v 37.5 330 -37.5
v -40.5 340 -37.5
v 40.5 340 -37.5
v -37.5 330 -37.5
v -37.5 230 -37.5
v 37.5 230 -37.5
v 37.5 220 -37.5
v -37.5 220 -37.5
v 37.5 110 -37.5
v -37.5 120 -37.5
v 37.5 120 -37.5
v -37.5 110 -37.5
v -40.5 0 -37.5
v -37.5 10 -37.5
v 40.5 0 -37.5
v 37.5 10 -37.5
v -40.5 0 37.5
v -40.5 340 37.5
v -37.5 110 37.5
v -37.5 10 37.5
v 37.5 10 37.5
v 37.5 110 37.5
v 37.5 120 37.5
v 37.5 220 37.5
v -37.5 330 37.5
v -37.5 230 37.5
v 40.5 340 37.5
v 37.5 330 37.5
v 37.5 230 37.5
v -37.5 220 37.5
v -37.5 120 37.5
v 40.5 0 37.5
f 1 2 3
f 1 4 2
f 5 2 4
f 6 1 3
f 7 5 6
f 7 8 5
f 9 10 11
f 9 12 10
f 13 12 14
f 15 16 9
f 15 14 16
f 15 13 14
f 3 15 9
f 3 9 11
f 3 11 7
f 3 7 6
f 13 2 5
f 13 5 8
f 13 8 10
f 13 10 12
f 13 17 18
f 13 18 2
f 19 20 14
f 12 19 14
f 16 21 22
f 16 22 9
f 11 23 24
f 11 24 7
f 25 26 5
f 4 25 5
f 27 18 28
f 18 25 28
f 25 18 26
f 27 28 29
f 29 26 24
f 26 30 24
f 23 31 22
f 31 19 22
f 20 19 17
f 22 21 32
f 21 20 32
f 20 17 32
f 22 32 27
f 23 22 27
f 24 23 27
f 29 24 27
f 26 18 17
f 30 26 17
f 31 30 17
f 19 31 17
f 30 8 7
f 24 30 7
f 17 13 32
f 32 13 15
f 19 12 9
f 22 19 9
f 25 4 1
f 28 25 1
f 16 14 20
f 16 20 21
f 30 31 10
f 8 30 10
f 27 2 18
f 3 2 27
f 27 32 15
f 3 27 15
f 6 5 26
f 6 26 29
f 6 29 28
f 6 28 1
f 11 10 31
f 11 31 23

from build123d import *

# Parameters (mm, degrees)
SKETCH3_W           = 75
SKETCH3_H           = 75
BOSS_EXTRUDE2_DEPTH = 10
LPATTERN1_COUNT     = 4
LPATTERN1_PITCH     = 110
SKETCH3_5_W         = 3
SKETCH3_5_H         = 75
BOSS_EXTRUDE5_DEPTH = 340


with BuildPart() as part:
    # Sketch3 → Boss-Extrude2 (new body)
    with BuildSketch(Plane(origin=(0, 0, 0), x_dir=(1, 0, 0), z_dir=(0, 1, 0))):
        Rectangle(SKETCH3_W, SKETCH3_H)
    extrude(amount=BOSS_EXTRUDE2_DEPTH)


with BuildPart() as lpattern1_1:
    # LPattern1: pattern copy
    add(part.part.moved(Location(Vector(0, 1, 0) * (1 * LPATTERN1_PITCH))))


with BuildPart() as lpattern1_2:
    # LPattern1: pattern copy
    add(part.part.moved(Location(Vector(0, 1, 0) * (2 * LPATTERN1_PITCH))))


with BuildPart() as lpattern1_3:
    # LPattern1: pattern copy
    add(part.part.moved(Location(Vector(0, 1, 0) * (3 * LPATTERN1_PITCH))))


with BuildPart() as part_1:
    add(part.part)

    add(lpattern1_1.part)  # Boss-Extrude5 merges LPattern1_1

    add(lpattern1_2.part)  # Boss-Extrude5 merges LPattern1_2

    add(lpattern1_3.part)  # Boss-Extrude5 merges LPattern1_3
    # Sketch3<5> → Boss-Extrude5 (add)
    with BuildSketch(Plane(origin=(0, 0, 0), x_dir=(1, 0, 0), z_dir=(0, 1, 0))):
        with Locations((39, 0)):
            Rectangle(SKETCH3_5_W, SKETCH3_5_H)
        with Locations((-39, 0)):
            Rectangle(SKETCH3_5_W, SKETCH3_5_H)
    extrude(amount=BOSS_EXTRUDE5_DEPTH)


solid = part_1.part
